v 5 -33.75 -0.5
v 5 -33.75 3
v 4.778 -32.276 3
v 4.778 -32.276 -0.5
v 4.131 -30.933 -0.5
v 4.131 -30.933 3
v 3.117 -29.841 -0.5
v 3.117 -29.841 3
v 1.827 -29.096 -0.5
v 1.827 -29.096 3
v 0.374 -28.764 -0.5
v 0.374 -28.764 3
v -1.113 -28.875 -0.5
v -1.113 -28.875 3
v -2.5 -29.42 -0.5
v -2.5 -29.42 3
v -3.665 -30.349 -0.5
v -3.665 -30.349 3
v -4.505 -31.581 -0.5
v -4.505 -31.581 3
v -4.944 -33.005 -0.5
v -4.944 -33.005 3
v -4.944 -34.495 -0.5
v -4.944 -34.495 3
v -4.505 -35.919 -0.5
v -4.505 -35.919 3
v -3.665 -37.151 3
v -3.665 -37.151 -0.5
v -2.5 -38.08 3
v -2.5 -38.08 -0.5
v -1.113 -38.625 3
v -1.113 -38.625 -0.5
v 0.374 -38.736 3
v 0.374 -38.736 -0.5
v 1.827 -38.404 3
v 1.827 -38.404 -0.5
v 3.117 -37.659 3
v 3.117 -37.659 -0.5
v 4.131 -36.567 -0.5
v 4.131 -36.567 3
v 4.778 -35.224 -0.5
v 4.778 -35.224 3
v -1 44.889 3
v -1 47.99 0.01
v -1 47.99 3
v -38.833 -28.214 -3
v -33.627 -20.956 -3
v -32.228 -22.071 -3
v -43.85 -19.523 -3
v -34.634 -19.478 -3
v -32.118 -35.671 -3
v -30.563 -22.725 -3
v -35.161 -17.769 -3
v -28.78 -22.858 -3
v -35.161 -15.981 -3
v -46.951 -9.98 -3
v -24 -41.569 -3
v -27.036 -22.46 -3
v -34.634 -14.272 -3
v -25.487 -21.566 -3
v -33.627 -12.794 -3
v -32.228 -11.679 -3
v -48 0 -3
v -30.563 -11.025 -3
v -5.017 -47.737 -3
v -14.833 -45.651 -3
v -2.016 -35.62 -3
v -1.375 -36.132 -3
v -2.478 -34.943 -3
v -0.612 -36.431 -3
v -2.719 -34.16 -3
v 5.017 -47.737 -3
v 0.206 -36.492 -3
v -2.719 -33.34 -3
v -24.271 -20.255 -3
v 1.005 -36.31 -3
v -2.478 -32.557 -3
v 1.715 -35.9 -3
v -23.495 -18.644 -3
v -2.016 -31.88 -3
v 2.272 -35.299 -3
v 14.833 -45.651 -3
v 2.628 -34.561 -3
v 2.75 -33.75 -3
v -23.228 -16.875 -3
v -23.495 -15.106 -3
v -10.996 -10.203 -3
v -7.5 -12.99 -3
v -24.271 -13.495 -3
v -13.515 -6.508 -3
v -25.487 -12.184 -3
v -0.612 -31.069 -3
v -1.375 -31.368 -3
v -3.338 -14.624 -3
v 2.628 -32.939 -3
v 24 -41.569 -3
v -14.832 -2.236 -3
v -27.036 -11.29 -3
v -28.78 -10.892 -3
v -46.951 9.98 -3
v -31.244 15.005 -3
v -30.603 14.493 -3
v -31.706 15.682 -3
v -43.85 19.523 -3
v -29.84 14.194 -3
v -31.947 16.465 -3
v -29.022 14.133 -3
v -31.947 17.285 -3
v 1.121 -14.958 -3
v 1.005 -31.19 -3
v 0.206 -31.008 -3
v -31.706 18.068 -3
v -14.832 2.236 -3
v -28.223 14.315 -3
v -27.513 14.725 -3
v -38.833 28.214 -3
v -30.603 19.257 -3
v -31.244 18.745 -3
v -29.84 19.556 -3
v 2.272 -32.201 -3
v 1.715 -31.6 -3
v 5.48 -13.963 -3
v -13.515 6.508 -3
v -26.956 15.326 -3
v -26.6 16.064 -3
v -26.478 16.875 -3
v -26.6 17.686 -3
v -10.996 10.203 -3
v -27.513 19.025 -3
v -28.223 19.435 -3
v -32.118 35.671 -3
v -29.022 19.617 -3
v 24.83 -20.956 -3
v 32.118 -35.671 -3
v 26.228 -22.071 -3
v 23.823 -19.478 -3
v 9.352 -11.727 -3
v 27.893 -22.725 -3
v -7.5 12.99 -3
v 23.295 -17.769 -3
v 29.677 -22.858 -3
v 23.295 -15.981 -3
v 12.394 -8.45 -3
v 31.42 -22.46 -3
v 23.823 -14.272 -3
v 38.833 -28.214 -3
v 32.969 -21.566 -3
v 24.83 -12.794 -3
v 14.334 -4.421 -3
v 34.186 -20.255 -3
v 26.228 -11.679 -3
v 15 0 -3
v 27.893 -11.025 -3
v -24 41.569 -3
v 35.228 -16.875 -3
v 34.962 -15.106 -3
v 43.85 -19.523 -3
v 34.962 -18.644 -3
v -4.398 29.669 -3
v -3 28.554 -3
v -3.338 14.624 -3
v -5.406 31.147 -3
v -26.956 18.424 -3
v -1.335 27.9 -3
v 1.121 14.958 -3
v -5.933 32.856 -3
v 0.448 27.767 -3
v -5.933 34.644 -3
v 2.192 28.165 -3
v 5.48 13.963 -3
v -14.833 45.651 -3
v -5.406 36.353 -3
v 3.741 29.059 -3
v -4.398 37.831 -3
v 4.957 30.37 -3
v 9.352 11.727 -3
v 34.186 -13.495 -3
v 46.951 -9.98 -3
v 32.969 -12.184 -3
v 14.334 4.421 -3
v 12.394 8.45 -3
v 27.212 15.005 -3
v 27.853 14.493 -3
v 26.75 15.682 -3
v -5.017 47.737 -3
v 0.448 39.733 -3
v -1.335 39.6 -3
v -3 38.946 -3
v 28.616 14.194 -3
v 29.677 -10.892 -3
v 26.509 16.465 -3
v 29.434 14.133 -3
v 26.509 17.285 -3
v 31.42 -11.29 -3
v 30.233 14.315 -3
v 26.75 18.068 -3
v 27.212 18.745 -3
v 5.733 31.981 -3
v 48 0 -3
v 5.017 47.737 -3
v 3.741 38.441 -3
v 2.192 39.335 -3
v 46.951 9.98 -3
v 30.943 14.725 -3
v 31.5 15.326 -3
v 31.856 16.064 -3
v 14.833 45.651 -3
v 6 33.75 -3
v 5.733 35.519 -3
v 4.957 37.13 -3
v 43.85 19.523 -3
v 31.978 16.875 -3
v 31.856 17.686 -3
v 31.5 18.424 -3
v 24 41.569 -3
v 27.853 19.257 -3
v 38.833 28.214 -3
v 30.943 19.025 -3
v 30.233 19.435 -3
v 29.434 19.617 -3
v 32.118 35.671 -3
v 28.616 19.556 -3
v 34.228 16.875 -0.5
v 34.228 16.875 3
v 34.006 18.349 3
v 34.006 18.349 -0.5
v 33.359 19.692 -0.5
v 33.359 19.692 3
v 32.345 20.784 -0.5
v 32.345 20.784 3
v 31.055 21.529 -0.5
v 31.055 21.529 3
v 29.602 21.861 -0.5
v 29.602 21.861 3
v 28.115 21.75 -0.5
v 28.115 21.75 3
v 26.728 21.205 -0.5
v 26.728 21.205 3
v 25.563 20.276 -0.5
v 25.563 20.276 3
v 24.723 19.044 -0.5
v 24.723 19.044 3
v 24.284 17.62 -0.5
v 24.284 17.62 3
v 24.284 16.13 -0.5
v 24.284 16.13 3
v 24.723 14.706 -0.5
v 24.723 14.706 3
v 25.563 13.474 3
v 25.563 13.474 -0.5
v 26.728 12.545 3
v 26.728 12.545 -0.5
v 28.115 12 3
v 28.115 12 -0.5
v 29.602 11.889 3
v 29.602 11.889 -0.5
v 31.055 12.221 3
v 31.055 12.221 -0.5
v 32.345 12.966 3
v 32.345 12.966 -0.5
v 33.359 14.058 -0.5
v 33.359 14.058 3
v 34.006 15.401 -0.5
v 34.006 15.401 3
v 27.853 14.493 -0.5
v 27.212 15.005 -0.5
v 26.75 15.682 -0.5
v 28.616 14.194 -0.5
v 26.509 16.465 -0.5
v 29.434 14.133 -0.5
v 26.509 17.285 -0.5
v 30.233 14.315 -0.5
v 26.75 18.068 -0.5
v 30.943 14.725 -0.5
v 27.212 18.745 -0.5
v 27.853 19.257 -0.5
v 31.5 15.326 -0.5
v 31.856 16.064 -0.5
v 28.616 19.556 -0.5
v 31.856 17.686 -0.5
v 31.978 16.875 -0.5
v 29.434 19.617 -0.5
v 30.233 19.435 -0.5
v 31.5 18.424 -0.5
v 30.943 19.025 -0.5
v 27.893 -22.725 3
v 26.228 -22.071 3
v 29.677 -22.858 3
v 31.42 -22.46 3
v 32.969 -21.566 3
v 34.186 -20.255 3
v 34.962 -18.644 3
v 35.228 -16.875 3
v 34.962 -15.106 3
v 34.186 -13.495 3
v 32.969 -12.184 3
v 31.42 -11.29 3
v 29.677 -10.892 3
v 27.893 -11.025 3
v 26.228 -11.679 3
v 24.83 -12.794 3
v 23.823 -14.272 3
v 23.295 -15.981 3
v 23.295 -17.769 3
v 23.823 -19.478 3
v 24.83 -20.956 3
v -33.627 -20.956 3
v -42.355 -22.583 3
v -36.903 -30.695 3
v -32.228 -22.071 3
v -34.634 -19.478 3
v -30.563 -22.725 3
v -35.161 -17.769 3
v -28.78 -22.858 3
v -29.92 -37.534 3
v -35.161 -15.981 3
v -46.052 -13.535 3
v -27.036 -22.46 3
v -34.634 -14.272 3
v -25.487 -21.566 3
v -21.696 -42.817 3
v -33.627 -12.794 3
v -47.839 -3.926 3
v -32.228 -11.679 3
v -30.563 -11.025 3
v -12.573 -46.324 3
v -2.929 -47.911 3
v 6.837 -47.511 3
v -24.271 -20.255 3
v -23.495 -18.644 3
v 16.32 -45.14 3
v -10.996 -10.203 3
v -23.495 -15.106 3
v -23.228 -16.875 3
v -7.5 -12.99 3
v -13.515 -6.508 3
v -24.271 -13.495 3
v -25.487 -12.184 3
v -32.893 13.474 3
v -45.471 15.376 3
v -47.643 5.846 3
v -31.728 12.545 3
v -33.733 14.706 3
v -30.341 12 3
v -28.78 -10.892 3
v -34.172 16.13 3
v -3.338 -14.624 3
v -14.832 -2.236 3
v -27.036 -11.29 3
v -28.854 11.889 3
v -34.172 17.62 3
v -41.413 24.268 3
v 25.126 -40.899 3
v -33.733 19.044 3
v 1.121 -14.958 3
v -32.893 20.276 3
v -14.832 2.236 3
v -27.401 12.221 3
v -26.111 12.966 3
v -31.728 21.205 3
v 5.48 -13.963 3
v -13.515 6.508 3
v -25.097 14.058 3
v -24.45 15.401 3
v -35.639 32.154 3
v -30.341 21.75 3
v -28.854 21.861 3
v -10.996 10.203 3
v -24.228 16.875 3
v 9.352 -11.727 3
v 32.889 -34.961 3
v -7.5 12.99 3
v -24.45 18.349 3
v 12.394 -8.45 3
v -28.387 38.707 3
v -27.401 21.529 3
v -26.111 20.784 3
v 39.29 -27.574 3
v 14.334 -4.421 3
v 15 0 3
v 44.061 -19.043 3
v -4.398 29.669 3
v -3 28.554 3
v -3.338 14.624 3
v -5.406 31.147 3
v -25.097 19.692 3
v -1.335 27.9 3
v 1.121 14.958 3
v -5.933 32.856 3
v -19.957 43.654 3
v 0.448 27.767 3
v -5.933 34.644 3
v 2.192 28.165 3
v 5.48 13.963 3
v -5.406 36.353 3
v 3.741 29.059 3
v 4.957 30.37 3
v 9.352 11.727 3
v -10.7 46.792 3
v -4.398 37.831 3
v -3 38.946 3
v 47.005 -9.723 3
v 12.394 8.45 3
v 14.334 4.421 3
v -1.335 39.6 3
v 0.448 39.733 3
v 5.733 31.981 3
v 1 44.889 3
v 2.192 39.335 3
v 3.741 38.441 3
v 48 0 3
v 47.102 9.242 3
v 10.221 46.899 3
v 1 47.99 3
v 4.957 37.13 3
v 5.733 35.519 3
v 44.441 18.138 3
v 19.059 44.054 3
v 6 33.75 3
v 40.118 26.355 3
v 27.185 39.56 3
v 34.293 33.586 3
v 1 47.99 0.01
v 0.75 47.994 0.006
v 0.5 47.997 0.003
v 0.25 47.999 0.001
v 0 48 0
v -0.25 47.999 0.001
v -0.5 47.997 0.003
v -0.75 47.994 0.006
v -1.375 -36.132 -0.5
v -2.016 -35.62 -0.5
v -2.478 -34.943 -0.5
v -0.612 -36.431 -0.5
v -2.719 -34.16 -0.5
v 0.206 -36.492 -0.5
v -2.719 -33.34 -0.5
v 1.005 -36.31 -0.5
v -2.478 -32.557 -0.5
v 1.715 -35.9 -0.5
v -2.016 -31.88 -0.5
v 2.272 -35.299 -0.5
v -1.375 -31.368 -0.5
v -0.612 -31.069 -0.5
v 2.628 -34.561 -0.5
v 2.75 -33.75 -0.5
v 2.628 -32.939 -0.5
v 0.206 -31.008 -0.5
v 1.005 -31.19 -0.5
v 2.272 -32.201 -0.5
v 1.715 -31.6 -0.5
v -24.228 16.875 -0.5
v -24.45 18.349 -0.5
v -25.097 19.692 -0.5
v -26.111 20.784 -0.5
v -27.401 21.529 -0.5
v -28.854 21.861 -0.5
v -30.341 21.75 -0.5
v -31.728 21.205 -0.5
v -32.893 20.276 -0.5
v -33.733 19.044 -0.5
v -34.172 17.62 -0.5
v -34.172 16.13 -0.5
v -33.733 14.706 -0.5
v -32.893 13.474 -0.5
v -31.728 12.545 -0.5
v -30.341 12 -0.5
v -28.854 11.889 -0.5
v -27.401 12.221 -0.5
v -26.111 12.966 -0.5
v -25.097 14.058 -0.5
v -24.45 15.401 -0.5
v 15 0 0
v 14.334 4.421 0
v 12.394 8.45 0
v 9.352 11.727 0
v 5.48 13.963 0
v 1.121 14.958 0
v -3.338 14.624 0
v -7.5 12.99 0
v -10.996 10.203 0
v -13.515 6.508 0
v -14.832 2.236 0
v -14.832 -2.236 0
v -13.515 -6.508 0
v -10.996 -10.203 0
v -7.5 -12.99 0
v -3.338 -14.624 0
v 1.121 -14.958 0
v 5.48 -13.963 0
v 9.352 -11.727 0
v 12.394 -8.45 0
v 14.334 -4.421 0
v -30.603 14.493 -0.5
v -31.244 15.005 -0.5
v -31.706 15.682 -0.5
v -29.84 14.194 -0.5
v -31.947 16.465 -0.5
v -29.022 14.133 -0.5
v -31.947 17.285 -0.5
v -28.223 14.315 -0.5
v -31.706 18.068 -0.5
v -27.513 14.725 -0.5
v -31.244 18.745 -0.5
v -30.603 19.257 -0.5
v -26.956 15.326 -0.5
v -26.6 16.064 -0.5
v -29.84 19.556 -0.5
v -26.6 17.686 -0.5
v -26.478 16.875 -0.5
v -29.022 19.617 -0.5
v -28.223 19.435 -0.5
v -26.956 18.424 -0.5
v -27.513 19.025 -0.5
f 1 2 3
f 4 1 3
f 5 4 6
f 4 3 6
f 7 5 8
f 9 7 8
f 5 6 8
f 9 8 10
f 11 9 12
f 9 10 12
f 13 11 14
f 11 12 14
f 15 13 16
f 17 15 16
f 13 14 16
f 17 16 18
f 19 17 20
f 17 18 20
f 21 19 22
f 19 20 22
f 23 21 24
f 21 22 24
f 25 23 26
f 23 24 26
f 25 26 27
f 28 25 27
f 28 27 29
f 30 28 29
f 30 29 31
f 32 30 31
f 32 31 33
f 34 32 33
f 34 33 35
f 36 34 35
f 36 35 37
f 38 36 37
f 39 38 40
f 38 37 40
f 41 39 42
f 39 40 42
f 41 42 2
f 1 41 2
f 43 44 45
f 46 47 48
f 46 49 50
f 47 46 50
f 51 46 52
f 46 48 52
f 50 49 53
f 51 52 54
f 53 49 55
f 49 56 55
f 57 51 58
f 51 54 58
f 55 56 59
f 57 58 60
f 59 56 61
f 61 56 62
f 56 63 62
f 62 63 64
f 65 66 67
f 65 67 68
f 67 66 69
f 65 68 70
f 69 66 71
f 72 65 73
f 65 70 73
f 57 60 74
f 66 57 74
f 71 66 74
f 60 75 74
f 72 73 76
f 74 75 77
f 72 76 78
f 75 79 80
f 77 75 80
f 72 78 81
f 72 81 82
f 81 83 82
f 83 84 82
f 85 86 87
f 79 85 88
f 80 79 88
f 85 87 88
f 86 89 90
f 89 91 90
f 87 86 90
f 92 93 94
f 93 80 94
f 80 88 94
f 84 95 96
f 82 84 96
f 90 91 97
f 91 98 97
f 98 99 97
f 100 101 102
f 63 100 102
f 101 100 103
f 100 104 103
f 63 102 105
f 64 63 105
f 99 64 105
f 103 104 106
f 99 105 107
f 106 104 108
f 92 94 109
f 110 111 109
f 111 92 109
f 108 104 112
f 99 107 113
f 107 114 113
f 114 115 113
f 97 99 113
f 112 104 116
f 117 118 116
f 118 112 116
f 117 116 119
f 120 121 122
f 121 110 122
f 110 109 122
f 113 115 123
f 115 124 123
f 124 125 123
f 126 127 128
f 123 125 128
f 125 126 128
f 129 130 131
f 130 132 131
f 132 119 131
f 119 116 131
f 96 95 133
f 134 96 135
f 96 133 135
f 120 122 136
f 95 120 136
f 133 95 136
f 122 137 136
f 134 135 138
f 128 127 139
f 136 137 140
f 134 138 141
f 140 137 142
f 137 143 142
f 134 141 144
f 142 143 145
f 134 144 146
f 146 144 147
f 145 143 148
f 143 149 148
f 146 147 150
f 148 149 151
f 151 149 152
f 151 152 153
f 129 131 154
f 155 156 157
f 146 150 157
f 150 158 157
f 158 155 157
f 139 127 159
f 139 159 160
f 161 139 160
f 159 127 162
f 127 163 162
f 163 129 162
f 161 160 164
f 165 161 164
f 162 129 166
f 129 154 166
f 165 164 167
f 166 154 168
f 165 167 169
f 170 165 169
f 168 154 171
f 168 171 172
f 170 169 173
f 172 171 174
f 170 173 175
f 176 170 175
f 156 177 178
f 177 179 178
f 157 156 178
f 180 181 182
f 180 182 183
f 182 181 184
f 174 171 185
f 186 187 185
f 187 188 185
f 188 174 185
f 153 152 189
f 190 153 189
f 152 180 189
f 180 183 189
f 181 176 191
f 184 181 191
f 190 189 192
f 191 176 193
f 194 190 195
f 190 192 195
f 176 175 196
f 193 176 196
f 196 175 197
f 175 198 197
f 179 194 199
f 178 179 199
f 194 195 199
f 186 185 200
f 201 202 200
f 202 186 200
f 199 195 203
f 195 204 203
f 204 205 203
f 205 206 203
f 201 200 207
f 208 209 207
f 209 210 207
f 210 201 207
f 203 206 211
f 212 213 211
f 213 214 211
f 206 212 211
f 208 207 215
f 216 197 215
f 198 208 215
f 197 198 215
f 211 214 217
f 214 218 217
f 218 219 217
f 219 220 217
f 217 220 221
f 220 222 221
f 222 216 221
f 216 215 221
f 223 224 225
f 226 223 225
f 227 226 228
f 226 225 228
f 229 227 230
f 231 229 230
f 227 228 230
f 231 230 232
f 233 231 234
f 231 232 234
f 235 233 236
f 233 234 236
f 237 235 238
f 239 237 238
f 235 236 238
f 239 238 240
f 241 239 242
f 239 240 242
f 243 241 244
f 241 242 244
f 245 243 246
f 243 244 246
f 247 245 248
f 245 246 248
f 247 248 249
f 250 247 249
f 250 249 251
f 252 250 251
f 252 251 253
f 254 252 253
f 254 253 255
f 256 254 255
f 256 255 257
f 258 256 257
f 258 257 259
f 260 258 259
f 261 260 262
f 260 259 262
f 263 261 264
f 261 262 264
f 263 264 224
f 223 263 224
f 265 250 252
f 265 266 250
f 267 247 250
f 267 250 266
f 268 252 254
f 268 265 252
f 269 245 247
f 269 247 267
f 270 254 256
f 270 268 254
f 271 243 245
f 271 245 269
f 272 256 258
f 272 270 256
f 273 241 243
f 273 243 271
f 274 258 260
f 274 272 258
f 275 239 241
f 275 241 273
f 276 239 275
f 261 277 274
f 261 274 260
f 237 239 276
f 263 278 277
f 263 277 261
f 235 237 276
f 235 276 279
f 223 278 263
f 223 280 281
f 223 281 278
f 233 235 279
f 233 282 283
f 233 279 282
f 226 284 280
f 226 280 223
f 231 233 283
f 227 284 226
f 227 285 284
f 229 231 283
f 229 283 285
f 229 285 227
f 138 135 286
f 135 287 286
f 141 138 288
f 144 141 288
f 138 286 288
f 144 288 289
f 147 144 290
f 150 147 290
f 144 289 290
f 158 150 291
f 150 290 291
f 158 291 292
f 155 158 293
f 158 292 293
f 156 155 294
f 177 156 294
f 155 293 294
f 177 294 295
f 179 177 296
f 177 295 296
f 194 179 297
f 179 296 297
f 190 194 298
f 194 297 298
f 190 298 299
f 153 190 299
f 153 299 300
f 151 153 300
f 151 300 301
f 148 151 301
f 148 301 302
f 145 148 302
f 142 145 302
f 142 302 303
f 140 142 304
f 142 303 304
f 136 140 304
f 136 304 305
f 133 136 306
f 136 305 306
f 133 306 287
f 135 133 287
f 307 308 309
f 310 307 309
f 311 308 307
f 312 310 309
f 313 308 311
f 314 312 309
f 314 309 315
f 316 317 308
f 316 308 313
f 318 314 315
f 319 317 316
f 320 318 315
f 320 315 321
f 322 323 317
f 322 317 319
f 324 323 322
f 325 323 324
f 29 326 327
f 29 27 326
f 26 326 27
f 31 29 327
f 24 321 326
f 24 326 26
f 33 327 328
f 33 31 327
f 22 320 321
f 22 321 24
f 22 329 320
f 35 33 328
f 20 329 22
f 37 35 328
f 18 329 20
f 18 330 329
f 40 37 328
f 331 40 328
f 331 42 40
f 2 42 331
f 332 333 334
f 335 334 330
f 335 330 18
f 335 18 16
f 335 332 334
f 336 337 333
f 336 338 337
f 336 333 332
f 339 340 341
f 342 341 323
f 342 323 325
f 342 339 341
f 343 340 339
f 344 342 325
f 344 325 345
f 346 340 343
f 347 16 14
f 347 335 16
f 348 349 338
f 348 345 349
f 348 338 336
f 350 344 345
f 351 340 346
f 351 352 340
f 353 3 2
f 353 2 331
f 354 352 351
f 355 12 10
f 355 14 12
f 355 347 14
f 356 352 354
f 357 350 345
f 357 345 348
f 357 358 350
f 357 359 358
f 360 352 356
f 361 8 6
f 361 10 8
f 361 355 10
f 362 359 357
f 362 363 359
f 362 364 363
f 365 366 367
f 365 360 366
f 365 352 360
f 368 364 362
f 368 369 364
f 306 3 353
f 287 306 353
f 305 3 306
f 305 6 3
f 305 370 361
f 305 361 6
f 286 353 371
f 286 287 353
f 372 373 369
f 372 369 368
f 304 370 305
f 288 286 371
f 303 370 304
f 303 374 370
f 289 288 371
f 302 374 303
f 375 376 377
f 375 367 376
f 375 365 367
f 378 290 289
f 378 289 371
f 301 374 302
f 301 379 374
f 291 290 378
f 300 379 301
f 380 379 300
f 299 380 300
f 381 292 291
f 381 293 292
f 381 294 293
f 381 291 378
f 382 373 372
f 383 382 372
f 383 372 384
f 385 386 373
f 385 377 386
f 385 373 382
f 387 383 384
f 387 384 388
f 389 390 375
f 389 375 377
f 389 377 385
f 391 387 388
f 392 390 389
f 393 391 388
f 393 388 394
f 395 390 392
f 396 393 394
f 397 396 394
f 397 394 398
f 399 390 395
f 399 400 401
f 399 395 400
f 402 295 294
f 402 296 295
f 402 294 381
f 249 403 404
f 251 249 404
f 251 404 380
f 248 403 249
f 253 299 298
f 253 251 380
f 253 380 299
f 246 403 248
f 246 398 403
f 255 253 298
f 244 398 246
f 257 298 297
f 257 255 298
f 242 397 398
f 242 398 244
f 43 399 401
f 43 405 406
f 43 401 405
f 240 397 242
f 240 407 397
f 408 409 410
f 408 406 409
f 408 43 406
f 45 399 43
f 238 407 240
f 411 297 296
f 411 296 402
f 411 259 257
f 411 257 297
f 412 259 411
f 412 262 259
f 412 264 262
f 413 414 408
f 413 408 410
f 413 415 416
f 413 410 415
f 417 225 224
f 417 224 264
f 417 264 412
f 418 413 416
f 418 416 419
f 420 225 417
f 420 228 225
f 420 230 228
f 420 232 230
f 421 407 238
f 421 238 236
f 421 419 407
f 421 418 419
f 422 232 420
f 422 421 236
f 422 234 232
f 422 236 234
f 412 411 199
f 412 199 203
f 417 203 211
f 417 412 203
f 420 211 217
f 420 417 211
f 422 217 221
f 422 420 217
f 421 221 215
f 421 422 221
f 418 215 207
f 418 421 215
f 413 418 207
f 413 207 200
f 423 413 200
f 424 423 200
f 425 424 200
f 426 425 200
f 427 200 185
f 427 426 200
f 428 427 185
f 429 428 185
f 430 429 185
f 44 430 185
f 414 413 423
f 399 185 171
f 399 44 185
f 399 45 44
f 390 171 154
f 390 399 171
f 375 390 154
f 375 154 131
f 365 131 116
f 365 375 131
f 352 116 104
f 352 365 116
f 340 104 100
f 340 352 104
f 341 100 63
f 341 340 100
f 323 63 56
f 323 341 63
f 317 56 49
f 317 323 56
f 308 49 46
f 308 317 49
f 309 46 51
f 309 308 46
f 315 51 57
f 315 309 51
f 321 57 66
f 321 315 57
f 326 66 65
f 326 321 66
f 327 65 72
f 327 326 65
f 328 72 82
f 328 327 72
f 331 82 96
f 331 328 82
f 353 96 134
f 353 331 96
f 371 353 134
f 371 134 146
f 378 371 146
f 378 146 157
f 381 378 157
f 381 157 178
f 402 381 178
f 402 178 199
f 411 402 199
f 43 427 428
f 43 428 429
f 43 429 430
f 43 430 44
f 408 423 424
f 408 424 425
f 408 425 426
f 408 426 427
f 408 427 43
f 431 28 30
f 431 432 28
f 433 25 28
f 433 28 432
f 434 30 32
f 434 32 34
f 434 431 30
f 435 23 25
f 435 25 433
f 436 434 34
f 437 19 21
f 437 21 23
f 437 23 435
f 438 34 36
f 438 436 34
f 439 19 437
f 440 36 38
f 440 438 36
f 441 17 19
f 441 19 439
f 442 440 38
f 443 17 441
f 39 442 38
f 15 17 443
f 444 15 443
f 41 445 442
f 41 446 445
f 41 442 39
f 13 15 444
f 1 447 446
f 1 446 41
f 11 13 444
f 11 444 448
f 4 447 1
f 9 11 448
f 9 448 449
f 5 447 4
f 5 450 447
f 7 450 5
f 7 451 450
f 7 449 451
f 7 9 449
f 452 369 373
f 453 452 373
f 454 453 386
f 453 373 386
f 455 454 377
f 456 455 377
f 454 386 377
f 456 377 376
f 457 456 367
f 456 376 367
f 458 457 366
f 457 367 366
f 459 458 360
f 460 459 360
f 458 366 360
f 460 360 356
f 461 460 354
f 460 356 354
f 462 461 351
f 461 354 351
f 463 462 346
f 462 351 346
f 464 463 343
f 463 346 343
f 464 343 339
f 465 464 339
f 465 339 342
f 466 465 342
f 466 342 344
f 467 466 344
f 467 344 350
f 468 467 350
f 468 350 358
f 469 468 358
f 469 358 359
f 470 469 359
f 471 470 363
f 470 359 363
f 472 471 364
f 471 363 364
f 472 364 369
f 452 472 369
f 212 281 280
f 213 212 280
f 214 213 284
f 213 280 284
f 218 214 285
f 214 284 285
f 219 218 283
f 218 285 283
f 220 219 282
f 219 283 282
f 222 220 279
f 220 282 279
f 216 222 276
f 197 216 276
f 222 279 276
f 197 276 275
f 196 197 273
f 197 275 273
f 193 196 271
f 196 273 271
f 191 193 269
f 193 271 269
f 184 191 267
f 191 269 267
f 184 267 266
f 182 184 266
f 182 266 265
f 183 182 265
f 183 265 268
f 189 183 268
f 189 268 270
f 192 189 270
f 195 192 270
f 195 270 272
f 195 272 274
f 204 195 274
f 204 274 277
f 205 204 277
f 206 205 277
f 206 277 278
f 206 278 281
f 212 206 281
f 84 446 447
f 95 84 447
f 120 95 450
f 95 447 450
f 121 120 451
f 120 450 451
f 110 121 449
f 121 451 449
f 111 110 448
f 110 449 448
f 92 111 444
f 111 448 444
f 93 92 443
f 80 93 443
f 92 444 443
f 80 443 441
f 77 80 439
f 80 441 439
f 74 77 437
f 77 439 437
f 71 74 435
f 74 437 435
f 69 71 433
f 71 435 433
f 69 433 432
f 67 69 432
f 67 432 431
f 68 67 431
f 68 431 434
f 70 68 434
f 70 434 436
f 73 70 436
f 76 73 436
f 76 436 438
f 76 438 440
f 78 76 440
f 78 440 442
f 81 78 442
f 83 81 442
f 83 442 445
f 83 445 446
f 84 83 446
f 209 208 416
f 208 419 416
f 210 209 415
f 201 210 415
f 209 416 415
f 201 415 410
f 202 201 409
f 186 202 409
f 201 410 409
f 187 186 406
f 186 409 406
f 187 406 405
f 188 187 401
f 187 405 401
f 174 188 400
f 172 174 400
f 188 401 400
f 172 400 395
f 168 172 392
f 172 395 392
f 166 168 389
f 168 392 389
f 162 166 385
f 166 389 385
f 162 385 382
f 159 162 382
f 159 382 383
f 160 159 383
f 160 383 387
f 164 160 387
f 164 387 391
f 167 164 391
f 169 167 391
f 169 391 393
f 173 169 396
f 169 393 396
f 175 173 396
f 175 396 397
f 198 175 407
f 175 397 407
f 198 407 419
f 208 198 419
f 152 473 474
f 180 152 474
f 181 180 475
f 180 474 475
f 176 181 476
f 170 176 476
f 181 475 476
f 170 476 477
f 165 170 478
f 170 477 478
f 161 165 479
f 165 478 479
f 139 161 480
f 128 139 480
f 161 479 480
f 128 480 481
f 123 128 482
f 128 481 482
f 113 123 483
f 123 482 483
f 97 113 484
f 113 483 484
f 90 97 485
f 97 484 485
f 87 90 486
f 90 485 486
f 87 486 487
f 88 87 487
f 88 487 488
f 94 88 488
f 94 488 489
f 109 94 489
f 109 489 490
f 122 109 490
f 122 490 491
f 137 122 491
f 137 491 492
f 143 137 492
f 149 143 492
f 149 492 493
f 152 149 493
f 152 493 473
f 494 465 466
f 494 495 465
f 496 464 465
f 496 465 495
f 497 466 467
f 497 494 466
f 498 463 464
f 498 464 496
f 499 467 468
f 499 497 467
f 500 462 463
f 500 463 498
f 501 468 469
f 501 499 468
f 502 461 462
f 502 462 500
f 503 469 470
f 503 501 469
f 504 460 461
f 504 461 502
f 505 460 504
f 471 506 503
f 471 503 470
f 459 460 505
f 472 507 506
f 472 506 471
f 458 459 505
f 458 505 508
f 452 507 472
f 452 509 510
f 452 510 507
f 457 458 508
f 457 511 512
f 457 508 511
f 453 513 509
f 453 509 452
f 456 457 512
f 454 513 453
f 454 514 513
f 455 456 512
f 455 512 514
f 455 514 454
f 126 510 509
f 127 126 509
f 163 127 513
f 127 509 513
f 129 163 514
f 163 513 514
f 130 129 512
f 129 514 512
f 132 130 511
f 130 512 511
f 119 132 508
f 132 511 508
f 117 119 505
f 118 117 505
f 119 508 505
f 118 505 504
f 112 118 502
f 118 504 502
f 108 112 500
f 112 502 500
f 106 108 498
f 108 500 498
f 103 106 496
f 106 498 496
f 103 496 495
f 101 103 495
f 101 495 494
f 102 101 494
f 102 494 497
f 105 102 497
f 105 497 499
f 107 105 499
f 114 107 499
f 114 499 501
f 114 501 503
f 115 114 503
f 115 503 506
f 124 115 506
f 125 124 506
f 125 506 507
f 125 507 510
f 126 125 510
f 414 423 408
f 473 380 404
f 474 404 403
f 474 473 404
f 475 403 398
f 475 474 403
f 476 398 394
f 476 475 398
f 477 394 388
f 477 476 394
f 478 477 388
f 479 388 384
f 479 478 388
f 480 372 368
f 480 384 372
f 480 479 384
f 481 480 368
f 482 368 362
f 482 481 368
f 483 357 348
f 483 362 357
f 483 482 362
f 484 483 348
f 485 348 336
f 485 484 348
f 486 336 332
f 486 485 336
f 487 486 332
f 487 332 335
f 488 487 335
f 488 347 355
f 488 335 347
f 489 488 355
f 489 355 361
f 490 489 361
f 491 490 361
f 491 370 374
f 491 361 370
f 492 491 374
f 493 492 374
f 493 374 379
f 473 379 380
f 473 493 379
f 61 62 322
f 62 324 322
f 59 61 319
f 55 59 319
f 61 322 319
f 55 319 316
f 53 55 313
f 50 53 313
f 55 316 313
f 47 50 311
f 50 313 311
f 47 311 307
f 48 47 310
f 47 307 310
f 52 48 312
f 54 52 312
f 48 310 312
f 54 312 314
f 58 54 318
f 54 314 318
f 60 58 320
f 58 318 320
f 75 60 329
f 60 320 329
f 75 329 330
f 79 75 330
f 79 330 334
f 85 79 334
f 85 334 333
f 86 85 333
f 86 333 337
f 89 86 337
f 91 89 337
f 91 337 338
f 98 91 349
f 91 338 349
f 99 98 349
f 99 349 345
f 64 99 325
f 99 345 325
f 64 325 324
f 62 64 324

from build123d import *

# Parameters (mm, degrees)
SKETCH1_R                        = 48
SKETCH1_R_2                      = 8
EX_CARRIER_FRONT_PLATE_4MM_DEPTH = 3
SKETCH2_R                        = 6
CUT_PIN_HOLE_12_DEPTH            = 69.14690015
PAT_PIN_HOLES_3X120_COUNT        = 3
CUT_EXTRUDE1_DEPTH               = 1
SKETCH4_R                        = 15
SKETCH4_R_2                      = 2.75
CUT_EXTRUDE2_DEPTH               = 68.948509917
SKETCH5_R                        = 15
SKETCH5_R_2                      = 2.75
CUT_EXTRUDE3_DEPTH               = 68.948509917
SKETCH6_R                        = 2.75
CUT_EXTRUDE4_DEPTH               = 68.948509917
SKETCH7_R                        = 2.75
CUT_EXTRUDE5_DEPTH               = 68.948509917
SKETCH8_R                        = 5
CUT_EXTRUDE7_DEPTH               = 3.5


with BuildPart() as part:
    # Sketch1 → EX_Carrier_Front_Plate_4mm (new, symmetric)
    with BuildSketch(Plane.XY):
        Circle(SKETCH1_R)
        Circle(SKETCH1_R_2, mode=Mode.SUBTRACT)
    extrude(amount=EX_CARRIER_FRONT_PLATE_4MM_DEPTH, both=True)

    # Sketch2 → CUT_Pin_Hole_Ø12 (cut, symmetric)
    with BuildSketch(Plane.XY.offset(3)):
        with Locations((0, 33.75)):
            Circle(SKETCH2_R)
    cut_pin_hole_12 = extrude(amount=CUT_PIN_HOLE_12_DEPTH, both=True, mode=Mode.SUBTRACT)

    # PAT_Pin_Holes_3x120: CUT_Pin_Hole_Ø12 ×3 about axis
    pat_pin_holes_3x120_axis = Axis((0, 0, 3), (0, 0, 1))
    for i in range(1, PAT_PIN_HOLES_3X120_COUNT):
        add(cut_pin_hole_12.rotate(pat_pin_holes_3x120_axis, i * 360 / PAT_PIN_HOLES_3X120_COUNT), mode=Mode.SUBTRACT)

    # Sketch3 → Cut-Extrude1 (cut, symmetric)
    with BuildSketch(Plane(origin=(0, 0, 0), x_dir=(0, 0, -1), z_dir=(1, 0, 0))):
        Polygon((0, 48), (-3, 44.889253006), (-3, 48), align=None)
    extrude(amount=CUT_EXTRUDE1_DEPTH, both=True, mode=Mode.SUBTRACT)

    # Sketch4 → Cut-Extrude2 (cut, through all)
    with BuildSketch(Plane.XY):
        Circle(SKETCH4_R)
        with Locations((0, -33.75)):
            Circle(SKETCH4_R_2)
    extrude(amount=CUT_EXTRUDE2_DEPTH, mode=Mode.SUBTRACT)

    # Sketch5 → Cut-Extrude3 (cut, through all)
    with BuildSketch(Plane.XY):
        Circle(SKETCH5_R)
        with Locations((0, -33.75)):
            Circle(SKETCH5_R_2)
    extrude(amount=-CUT_EXTRUDE3_DEPTH, mode=Mode.SUBTRACT)

    # Sketch6 → Cut-Extrude4 (cut, through all)
    with BuildSketch(Plane.XY):
        with Locations((29.228, 16.875)):
            Circle(SKETCH6_R)
        with Locations((-29.228, 16.875)):
            Circle(SKETCH6_R)
    extrude(amount=CUT_EXTRUDE4_DEPTH, mode=Mode.SUBTRACT)

    # Sketch7 → Cut-Extrude5 (cut, through all)
    with BuildSketch(Plane.XY):
        with Locations((29.228, 16.875)):
            Circle(SKETCH7_R)
        with Locations((-29.228, 16.875)):
            Circle(SKETCH7_R)
    extrude(amount=-CUT_EXTRUDE5_DEPTH, mode=Mode.SUBTRACT)

    # Sketch8 → Cut-Extrude7 (cut)
    with BuildSketch(Plane.XY.offset(3)):
        with Locations((0, -33.75)):
            Circle(SKETCH8_R)
        with Locations((29.228, 16.875)):
            Circle(SKETCH8_R)
        with Locations((-29.228, 16.875)):
            Circle(SKETCH8_R)
    extrude(amount=-CUT_EXTRUDE7_DEPTH, mode=Mode.SUBTRACT)


solid = part.part
